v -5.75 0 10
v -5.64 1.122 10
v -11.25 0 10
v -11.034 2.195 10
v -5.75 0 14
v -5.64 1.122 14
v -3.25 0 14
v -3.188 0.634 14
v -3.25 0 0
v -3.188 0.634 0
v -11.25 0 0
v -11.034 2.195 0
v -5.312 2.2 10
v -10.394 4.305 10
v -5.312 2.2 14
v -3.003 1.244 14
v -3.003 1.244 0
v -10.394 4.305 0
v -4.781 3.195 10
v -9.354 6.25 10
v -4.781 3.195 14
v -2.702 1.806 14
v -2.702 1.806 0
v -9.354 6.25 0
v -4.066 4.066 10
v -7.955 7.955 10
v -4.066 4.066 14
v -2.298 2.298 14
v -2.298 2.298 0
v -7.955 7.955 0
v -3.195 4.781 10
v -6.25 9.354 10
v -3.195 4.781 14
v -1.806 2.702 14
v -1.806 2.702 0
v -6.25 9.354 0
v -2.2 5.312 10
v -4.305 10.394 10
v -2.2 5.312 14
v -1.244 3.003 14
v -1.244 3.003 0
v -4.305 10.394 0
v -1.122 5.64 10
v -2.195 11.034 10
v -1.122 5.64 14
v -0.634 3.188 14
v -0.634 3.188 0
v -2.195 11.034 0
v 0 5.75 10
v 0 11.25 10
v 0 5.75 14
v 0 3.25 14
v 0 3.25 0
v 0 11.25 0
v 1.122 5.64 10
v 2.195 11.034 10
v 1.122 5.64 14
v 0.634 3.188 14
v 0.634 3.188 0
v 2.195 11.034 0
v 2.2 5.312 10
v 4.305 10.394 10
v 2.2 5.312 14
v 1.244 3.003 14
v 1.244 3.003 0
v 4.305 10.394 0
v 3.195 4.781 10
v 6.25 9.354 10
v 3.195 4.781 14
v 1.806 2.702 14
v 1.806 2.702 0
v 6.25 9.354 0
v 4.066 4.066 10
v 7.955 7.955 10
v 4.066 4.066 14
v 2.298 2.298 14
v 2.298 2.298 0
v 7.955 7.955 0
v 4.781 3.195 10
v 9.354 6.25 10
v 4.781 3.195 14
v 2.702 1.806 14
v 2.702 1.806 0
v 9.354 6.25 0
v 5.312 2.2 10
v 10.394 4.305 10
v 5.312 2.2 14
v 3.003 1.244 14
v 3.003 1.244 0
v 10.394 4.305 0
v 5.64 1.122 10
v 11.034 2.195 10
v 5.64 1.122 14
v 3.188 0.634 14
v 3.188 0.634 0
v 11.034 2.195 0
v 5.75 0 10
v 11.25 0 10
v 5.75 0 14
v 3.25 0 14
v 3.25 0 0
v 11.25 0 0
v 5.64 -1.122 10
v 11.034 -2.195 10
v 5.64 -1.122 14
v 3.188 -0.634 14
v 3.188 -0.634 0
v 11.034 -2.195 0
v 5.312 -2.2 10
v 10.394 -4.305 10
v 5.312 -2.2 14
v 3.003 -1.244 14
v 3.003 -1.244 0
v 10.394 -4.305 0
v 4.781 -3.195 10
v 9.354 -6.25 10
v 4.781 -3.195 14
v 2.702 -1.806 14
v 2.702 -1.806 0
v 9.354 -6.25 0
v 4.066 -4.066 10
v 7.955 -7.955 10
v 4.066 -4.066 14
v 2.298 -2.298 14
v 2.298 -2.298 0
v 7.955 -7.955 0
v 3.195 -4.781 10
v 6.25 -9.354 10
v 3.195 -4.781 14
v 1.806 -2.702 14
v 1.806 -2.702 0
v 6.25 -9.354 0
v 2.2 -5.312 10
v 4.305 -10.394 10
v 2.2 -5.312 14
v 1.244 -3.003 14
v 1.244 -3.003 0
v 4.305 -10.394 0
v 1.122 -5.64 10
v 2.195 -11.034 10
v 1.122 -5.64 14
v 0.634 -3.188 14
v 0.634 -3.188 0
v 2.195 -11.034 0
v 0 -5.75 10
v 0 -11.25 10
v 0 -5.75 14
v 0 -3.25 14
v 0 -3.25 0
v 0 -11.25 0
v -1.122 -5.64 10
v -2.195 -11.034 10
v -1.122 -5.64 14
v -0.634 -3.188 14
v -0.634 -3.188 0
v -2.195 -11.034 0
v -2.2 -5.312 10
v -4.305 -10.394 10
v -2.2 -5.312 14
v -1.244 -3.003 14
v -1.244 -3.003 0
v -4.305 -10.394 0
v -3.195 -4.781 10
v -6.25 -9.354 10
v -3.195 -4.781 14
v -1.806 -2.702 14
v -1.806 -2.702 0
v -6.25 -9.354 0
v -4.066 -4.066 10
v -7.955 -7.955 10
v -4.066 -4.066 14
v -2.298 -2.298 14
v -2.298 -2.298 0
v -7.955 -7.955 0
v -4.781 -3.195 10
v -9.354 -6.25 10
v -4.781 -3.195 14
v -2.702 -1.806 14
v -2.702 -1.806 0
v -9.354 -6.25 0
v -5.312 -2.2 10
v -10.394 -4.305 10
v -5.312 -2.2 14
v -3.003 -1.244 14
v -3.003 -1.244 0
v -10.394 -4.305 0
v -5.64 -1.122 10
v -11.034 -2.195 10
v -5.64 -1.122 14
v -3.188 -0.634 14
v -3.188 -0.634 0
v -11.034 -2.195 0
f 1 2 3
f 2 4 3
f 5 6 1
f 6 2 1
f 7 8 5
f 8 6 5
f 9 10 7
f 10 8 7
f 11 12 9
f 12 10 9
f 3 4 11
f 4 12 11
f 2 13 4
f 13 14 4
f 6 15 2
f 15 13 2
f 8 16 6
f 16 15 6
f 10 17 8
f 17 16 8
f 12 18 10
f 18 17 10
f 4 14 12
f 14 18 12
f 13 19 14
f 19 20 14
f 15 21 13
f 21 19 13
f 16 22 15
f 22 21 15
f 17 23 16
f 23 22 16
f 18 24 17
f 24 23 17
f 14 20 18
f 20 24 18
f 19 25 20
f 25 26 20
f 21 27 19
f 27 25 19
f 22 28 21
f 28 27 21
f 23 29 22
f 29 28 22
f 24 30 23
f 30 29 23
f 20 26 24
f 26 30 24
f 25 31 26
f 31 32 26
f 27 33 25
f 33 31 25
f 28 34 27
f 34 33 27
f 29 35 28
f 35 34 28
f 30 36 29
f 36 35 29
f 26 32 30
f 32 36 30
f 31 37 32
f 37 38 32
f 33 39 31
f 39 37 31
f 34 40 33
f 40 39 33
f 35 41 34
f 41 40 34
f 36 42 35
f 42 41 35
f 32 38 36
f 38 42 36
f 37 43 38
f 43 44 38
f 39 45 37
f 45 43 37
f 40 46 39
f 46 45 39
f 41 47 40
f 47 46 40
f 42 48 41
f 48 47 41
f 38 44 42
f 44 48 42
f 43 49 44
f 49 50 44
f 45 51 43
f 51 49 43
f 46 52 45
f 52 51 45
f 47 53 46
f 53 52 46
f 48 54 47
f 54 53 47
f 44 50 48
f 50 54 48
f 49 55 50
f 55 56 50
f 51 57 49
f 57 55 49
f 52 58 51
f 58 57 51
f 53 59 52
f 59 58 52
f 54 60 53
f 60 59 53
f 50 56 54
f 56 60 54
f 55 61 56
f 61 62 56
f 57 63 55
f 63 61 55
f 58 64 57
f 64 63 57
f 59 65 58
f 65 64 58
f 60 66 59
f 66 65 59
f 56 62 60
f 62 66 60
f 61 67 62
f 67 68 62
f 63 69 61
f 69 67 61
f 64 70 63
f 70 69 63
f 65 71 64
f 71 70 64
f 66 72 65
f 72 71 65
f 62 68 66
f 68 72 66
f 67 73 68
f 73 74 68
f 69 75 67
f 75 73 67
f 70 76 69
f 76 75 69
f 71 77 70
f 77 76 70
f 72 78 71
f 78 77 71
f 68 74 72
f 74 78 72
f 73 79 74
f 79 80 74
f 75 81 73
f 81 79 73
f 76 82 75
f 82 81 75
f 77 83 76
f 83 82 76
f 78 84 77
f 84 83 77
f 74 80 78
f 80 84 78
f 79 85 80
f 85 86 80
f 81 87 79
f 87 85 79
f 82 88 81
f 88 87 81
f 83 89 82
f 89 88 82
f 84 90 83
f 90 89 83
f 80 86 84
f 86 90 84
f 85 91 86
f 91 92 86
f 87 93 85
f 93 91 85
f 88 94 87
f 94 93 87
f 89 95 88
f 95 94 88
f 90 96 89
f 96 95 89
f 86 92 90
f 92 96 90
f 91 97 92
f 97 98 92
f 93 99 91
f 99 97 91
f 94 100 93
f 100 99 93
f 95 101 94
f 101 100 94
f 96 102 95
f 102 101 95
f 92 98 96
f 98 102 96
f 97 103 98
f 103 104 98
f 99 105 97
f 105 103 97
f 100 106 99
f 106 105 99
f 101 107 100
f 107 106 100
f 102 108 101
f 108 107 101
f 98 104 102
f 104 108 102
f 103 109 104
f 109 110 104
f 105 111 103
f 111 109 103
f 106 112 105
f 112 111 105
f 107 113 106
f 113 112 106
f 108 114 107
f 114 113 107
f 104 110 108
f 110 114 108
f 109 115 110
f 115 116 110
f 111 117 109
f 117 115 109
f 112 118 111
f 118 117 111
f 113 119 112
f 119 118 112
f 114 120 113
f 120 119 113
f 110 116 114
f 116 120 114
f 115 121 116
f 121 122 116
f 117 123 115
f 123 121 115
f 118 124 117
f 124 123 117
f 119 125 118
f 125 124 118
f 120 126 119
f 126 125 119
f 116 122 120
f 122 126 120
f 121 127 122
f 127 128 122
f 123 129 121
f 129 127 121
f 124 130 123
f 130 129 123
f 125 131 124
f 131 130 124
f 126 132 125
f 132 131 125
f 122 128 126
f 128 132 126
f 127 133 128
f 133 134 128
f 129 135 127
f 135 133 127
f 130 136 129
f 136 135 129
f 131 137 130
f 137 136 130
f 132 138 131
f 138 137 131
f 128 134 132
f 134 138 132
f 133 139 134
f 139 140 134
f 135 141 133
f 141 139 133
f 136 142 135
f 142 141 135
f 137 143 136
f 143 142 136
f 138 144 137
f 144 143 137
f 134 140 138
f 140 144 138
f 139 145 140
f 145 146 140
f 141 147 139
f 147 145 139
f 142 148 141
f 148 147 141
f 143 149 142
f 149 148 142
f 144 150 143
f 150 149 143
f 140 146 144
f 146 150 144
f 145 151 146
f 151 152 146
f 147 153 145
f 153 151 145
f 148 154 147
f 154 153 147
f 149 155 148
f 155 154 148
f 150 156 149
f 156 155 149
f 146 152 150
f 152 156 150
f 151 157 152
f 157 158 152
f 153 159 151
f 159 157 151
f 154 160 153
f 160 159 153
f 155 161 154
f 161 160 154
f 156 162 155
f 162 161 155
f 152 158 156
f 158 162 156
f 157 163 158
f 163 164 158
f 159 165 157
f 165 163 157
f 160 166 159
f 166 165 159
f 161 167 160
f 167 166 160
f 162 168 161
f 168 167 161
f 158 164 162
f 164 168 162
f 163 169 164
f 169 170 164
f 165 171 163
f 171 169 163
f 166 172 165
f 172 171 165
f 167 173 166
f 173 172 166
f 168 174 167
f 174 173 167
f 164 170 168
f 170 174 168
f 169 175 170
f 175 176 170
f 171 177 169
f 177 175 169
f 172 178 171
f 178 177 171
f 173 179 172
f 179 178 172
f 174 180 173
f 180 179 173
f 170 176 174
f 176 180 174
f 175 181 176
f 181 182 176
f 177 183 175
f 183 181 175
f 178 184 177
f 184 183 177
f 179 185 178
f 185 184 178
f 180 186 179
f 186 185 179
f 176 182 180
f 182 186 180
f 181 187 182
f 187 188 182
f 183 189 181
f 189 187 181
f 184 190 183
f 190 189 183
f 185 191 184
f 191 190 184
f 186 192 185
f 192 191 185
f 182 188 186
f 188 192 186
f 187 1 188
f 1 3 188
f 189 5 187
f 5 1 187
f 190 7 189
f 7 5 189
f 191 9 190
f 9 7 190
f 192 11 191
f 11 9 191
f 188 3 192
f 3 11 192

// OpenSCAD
$fn = 32;

// ----------------------------------------------------------------------
// Form washer: stepped_c washer, 22.5 mm outside, 6.5 mm bore
// ----------------------------------------------------------------------

// --- parameters (mm) ---
revolve_angle = 360;      // full turn around the Z axis
profile_points = 6;       // points of the closed outline

profile = [[3.25, 0], [11.25, 0], [11.25, 10], [5.75, 10], [5.75, 14], [3.25, 14]];  // single closed polygon, 6 points, counter clockwise

// --- the one profile operation ---
rotate_extrude(angle = revolve_angle) polygon(points = profile);
